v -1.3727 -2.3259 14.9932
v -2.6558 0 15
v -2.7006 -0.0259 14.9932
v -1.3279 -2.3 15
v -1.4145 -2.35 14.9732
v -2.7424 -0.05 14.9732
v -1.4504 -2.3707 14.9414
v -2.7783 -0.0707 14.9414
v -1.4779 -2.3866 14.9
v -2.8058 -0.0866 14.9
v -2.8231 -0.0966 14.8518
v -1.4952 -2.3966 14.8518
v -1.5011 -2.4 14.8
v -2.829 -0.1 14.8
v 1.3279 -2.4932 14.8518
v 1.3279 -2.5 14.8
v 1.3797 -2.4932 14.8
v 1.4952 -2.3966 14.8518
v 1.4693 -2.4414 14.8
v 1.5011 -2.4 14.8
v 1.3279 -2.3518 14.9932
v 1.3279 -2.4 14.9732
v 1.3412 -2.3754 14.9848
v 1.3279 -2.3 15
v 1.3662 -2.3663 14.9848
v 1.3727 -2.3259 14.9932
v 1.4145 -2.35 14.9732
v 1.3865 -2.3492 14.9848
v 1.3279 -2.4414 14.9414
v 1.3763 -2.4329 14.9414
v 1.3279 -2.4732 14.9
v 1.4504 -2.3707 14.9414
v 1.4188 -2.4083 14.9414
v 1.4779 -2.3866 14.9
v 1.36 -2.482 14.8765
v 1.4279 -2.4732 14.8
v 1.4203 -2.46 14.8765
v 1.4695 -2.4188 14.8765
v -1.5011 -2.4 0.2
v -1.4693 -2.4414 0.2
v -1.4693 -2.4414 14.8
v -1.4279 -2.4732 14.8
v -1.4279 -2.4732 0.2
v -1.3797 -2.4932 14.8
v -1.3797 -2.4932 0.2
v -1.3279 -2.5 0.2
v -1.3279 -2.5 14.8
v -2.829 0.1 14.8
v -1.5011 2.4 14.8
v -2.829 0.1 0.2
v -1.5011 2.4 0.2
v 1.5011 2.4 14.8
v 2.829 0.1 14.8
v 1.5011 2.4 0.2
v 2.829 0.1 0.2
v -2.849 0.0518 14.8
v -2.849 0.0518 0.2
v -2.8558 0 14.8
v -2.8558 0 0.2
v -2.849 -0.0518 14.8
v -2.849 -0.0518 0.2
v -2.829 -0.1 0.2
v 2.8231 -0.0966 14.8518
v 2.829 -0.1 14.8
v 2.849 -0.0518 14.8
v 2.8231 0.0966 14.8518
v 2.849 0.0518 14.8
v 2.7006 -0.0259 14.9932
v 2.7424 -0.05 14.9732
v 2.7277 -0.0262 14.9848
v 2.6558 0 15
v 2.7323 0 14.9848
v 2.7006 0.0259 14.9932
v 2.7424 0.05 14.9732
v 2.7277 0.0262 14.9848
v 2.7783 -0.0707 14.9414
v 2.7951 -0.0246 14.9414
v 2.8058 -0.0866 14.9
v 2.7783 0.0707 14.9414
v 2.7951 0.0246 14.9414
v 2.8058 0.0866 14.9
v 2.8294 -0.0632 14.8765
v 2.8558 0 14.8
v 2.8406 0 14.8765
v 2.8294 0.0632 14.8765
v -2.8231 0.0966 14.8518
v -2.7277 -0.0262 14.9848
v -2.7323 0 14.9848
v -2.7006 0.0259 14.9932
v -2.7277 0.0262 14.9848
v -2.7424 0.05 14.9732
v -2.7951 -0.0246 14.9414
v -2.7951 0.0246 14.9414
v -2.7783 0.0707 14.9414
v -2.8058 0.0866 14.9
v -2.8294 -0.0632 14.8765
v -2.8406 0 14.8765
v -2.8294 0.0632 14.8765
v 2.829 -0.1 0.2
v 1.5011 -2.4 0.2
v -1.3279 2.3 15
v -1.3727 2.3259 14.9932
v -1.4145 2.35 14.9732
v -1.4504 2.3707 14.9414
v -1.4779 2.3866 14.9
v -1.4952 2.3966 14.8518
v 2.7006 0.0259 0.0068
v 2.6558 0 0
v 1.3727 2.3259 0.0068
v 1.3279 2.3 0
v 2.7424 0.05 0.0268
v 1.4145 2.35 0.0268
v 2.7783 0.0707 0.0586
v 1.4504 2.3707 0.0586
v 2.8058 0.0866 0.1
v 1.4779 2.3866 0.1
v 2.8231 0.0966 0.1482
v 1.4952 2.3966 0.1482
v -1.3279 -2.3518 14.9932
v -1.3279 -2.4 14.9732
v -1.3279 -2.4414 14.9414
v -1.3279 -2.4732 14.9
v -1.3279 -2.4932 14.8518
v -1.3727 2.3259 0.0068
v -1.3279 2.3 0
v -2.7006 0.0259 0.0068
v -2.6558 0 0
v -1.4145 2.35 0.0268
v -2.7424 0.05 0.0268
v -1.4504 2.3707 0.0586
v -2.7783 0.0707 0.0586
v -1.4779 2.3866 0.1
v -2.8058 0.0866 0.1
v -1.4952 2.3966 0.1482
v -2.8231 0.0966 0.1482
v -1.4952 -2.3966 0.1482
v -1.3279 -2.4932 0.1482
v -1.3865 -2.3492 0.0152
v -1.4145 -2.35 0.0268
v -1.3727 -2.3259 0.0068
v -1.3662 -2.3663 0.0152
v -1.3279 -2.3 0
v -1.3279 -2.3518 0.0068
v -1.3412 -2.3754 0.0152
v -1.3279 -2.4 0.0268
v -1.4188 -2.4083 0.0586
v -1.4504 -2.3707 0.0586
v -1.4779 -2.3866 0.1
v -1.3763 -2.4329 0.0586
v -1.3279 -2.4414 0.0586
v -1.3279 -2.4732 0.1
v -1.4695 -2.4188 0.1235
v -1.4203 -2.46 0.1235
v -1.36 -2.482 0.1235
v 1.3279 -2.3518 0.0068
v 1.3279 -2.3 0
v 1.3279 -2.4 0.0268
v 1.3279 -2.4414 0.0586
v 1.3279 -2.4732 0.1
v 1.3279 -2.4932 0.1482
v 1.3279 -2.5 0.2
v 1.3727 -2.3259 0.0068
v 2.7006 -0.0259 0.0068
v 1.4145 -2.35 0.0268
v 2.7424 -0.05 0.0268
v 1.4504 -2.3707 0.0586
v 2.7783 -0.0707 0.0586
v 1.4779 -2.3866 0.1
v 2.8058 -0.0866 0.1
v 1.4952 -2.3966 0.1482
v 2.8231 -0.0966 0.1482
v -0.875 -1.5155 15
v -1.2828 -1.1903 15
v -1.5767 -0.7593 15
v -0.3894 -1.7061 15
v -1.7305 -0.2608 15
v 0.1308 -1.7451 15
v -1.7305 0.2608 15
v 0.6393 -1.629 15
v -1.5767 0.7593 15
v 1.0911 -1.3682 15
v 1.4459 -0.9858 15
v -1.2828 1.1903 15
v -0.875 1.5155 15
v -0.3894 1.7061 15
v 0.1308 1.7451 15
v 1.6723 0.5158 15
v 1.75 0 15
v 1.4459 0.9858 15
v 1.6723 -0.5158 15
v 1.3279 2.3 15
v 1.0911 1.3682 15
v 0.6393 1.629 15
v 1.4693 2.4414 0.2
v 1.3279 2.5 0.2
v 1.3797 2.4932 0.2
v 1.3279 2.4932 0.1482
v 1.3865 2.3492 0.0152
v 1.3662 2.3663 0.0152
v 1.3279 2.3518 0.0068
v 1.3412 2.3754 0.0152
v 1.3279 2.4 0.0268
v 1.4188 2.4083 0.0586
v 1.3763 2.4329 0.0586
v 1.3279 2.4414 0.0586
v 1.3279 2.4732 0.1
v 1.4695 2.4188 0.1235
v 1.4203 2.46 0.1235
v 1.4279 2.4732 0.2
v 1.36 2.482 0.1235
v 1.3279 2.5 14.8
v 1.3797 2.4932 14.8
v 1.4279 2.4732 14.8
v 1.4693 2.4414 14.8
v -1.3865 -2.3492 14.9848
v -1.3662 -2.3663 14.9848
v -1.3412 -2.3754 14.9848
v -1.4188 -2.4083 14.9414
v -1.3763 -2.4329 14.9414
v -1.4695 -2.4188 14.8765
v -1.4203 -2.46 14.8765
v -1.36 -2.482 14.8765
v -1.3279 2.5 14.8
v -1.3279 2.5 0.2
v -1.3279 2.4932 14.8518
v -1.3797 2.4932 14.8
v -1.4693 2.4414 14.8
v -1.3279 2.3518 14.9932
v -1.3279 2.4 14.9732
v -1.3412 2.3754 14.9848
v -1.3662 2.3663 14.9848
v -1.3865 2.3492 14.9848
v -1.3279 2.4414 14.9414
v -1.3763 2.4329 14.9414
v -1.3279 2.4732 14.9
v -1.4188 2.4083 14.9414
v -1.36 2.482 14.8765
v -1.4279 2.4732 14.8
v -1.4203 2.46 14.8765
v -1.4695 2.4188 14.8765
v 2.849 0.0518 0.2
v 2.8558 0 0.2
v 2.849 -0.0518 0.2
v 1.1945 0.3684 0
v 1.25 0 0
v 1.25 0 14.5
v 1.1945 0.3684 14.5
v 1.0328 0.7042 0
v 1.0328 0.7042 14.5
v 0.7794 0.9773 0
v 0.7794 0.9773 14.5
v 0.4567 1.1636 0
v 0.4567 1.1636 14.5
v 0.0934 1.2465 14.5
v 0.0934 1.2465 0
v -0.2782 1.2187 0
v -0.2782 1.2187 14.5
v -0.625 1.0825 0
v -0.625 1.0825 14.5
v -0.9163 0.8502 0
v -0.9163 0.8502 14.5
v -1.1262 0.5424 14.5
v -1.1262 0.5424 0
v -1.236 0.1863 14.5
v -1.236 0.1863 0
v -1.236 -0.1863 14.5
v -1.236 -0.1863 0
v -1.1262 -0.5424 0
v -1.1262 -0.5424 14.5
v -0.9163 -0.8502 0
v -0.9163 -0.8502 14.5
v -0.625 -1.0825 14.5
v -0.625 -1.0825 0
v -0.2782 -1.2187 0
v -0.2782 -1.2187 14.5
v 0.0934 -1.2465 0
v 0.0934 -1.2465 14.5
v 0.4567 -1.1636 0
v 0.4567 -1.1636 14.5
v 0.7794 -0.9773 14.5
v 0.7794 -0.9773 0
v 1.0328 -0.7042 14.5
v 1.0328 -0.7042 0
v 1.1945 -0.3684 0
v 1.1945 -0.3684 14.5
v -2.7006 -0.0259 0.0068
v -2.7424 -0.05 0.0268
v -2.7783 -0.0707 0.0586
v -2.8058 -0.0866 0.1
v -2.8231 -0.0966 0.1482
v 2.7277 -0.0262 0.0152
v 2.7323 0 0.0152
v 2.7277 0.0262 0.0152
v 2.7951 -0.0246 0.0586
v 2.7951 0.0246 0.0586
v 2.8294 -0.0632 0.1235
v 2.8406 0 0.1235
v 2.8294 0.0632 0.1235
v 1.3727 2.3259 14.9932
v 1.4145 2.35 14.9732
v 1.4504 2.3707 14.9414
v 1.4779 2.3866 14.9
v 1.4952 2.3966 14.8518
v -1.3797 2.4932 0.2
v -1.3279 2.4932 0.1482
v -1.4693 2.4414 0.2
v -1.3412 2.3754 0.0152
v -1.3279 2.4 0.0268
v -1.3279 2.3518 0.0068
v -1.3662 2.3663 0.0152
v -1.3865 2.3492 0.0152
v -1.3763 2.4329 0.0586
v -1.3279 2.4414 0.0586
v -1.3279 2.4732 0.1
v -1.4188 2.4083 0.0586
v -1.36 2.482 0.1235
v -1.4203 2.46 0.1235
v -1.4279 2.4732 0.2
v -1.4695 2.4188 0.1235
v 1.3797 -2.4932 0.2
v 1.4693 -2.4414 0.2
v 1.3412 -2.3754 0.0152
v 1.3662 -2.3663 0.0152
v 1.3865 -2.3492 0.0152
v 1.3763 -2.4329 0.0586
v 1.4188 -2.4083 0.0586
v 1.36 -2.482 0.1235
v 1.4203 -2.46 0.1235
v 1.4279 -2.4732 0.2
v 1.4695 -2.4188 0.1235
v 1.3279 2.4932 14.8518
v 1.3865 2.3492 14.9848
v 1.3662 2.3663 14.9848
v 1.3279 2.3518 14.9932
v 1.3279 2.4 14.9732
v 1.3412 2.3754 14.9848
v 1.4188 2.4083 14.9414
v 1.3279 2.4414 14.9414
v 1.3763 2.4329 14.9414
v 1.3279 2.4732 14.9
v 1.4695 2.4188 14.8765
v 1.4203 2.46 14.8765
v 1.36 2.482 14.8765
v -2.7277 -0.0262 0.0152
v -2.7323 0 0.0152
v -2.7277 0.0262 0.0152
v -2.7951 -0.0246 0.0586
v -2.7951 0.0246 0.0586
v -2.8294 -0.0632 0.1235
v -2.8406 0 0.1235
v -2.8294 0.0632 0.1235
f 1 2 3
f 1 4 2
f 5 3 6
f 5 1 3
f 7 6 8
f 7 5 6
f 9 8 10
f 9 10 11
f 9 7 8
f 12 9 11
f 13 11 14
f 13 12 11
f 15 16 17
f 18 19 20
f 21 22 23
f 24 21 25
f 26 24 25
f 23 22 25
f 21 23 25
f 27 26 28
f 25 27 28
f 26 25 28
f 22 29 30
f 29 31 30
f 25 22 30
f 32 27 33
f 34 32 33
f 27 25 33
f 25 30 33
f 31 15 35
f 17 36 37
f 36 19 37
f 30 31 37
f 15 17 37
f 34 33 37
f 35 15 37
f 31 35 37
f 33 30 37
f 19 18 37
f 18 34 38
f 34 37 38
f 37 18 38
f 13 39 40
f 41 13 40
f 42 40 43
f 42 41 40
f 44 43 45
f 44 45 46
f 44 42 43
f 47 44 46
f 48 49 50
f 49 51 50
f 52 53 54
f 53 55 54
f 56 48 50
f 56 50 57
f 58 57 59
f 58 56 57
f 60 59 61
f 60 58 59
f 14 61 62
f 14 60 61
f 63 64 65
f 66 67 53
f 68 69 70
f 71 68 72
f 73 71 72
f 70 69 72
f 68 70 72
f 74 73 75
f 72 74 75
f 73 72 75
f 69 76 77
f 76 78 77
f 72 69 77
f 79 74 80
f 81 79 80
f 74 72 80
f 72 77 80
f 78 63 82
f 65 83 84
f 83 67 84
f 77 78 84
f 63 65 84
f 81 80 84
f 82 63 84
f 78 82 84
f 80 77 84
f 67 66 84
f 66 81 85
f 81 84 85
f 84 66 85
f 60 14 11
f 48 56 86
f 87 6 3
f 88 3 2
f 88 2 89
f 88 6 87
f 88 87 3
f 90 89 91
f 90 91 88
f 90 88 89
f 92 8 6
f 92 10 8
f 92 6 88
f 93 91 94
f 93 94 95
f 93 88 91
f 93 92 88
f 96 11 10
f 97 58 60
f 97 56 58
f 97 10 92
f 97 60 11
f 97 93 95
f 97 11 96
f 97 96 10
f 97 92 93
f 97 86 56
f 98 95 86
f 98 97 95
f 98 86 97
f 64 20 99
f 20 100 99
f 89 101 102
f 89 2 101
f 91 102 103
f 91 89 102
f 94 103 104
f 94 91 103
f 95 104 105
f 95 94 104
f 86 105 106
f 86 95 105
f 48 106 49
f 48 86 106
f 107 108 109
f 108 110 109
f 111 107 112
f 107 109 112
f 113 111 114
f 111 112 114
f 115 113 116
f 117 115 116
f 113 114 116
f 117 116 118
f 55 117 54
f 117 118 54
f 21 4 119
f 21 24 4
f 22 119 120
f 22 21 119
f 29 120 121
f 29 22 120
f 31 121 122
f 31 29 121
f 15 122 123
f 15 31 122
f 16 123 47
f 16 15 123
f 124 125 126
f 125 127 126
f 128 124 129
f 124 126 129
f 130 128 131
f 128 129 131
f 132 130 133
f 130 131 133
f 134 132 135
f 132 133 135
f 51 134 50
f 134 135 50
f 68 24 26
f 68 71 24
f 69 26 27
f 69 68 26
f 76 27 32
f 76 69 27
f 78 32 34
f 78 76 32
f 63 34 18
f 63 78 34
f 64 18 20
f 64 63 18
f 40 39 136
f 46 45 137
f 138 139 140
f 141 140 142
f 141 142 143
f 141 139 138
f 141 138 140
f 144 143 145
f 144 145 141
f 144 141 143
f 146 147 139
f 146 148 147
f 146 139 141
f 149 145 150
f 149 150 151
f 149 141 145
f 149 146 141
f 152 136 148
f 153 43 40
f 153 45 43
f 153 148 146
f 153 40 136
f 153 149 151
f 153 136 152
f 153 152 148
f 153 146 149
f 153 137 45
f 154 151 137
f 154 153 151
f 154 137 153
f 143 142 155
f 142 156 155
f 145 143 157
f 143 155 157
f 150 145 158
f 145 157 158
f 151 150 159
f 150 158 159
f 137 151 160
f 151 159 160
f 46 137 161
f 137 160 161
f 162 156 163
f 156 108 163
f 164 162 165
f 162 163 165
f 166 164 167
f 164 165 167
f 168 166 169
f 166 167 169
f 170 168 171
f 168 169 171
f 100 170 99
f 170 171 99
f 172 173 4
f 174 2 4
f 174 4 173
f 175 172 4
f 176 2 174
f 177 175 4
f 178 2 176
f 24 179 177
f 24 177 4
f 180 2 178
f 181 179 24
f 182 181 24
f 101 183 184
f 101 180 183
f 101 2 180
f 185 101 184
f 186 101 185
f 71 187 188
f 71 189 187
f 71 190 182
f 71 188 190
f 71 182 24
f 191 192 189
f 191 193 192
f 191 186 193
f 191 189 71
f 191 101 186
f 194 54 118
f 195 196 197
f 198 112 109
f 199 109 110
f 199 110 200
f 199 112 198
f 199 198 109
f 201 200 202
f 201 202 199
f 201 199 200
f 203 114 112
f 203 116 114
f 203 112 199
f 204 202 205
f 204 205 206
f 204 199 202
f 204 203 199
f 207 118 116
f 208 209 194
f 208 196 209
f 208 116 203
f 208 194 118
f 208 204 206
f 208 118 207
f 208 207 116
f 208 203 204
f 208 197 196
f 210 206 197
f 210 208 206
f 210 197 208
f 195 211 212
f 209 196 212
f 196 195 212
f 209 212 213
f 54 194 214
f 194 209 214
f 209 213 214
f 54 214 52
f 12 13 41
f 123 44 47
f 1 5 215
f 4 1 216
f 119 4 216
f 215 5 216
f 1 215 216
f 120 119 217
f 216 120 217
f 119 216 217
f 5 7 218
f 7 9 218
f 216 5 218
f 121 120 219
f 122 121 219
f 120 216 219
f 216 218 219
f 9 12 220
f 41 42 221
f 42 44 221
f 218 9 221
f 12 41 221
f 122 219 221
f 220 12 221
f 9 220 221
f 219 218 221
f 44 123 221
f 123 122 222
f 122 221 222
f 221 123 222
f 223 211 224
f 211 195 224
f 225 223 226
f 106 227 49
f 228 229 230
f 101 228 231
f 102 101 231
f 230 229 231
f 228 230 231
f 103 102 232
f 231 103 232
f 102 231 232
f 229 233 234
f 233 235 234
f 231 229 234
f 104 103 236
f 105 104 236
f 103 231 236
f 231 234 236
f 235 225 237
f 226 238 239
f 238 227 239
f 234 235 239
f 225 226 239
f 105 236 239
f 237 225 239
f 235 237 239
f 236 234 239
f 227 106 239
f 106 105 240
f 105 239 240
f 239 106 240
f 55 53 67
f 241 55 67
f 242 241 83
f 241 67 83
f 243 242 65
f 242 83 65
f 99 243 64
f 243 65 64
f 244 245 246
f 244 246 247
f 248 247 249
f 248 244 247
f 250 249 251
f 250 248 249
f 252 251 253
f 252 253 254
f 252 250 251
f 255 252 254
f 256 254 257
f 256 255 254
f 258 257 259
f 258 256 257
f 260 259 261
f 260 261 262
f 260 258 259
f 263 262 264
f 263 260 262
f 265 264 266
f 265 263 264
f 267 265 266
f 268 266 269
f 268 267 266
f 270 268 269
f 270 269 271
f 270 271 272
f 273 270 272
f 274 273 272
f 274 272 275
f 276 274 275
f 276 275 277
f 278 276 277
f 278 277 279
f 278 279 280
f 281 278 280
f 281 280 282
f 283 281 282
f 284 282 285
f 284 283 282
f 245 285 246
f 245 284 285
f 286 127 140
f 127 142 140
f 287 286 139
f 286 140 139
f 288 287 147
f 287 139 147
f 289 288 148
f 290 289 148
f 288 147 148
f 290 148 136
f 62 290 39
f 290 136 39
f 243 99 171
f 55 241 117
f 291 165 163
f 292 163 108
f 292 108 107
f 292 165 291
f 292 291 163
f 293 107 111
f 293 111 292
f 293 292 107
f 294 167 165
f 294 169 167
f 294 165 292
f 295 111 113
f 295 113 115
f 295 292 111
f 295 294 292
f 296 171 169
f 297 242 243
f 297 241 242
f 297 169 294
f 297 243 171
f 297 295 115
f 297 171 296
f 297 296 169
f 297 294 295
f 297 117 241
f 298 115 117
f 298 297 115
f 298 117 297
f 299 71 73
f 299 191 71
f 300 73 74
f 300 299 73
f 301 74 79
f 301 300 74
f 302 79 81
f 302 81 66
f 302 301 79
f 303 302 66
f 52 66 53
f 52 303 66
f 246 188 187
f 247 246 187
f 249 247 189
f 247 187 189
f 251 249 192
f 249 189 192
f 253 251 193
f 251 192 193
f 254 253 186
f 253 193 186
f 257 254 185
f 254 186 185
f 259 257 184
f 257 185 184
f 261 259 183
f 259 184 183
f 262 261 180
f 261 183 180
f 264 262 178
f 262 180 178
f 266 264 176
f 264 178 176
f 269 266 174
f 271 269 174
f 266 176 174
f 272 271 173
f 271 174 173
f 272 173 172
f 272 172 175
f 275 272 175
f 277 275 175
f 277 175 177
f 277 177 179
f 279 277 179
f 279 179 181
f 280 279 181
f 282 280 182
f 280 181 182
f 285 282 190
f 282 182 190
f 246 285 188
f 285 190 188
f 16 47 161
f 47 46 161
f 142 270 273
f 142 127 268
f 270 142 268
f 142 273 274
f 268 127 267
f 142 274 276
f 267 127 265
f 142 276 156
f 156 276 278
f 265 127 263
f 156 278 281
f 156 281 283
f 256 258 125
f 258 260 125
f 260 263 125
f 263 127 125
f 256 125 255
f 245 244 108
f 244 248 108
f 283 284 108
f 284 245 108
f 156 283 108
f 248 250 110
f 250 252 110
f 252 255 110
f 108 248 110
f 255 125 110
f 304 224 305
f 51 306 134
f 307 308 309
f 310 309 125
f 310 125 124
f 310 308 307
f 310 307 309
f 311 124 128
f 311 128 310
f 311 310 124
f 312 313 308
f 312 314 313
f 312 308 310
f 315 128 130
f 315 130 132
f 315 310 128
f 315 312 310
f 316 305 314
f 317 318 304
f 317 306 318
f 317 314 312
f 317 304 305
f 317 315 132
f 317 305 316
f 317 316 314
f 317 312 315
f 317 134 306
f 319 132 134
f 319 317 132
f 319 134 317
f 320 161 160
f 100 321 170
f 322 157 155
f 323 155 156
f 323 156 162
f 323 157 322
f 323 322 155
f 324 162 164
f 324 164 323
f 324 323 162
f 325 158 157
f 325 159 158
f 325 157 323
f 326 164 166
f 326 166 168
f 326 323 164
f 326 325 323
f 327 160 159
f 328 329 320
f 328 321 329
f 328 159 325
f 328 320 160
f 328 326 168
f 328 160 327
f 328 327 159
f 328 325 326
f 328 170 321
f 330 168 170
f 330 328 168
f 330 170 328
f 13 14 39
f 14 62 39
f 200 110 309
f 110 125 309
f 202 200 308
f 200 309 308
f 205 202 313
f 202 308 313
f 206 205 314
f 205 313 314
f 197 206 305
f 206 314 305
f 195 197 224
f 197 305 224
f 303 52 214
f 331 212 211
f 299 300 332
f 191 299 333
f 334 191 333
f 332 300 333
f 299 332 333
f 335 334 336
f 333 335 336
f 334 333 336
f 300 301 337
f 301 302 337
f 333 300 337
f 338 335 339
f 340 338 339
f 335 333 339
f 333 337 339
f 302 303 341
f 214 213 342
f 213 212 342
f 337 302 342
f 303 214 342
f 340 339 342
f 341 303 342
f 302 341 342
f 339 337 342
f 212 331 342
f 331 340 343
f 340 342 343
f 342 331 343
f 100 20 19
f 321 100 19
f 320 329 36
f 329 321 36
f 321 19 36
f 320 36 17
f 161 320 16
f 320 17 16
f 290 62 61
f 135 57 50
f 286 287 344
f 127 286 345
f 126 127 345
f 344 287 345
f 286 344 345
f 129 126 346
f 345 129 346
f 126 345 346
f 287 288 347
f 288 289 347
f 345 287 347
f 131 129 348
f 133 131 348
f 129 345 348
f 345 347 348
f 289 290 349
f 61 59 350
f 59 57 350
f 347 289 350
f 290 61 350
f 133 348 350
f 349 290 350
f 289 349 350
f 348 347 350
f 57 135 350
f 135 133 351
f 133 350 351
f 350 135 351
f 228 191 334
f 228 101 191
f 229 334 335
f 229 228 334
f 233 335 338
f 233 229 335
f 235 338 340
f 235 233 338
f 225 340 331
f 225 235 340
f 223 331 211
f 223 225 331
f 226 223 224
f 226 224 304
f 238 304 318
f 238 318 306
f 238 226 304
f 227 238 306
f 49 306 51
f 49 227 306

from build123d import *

# Parameters (mm, degrees)
F0_R     = 1.25
F1_DEPTH = 15
F2_SIZE  = 0.5
F3_R     = 0.2


with BuildPart() as f1:
    # F0 (on Top) → F1 (new body)
    with BuildSketch(Plane.XY):
        Polygon((1.443376, 2.5), (-1.443376, 2.5), (-2.886751, 0), (-1.443376, -2.5), (1.443376, -2.5), (2.886751, 0), align=None)
        Circle(F0_R, mode=Mode.SUBTRACT)
    extrude(amount=F1_DEPTH)

    # F2
    f2_edges = [f1.edges().sort_by_distance(p)[0] for p in [
        (-1.25, 0, 15),
    ]]
    chamfer(f2_edges, length=F2_SIZE)

    # F3
    f3_edges = [f1.edges().sort_by_distance(p)[0] for p in [
        (-2.165064, -1.25, 15),
        (0, -2.5, 15),
        (2.165064, -1.25, 15),
        (2.165064, 1.25, 15),
        (0, 2.5, 15),
        (-2.165064, 1.25, 15),
        (-2.165064, -1.25, 0),
        (0, -2.5, 0),
        (2.165064, -1.25, 0),
        (2.165064, 1.25, 0),
        (0, 2.5, 0),
        (-2.165064, 1.25, 0),
        (-1.443376, -2.5, 7.5),
        (1.443376, -2.5, 7.5),
        (-2.886751, 0, 7.5),
        (-1.443376, 2.5, 7.5),
        (1.443376, 2.5, 7.5),
        (2.886751, 0, 7.5),
    ]]
    fillet(f3_edges, radius=F3_R)


solid = f1.part
